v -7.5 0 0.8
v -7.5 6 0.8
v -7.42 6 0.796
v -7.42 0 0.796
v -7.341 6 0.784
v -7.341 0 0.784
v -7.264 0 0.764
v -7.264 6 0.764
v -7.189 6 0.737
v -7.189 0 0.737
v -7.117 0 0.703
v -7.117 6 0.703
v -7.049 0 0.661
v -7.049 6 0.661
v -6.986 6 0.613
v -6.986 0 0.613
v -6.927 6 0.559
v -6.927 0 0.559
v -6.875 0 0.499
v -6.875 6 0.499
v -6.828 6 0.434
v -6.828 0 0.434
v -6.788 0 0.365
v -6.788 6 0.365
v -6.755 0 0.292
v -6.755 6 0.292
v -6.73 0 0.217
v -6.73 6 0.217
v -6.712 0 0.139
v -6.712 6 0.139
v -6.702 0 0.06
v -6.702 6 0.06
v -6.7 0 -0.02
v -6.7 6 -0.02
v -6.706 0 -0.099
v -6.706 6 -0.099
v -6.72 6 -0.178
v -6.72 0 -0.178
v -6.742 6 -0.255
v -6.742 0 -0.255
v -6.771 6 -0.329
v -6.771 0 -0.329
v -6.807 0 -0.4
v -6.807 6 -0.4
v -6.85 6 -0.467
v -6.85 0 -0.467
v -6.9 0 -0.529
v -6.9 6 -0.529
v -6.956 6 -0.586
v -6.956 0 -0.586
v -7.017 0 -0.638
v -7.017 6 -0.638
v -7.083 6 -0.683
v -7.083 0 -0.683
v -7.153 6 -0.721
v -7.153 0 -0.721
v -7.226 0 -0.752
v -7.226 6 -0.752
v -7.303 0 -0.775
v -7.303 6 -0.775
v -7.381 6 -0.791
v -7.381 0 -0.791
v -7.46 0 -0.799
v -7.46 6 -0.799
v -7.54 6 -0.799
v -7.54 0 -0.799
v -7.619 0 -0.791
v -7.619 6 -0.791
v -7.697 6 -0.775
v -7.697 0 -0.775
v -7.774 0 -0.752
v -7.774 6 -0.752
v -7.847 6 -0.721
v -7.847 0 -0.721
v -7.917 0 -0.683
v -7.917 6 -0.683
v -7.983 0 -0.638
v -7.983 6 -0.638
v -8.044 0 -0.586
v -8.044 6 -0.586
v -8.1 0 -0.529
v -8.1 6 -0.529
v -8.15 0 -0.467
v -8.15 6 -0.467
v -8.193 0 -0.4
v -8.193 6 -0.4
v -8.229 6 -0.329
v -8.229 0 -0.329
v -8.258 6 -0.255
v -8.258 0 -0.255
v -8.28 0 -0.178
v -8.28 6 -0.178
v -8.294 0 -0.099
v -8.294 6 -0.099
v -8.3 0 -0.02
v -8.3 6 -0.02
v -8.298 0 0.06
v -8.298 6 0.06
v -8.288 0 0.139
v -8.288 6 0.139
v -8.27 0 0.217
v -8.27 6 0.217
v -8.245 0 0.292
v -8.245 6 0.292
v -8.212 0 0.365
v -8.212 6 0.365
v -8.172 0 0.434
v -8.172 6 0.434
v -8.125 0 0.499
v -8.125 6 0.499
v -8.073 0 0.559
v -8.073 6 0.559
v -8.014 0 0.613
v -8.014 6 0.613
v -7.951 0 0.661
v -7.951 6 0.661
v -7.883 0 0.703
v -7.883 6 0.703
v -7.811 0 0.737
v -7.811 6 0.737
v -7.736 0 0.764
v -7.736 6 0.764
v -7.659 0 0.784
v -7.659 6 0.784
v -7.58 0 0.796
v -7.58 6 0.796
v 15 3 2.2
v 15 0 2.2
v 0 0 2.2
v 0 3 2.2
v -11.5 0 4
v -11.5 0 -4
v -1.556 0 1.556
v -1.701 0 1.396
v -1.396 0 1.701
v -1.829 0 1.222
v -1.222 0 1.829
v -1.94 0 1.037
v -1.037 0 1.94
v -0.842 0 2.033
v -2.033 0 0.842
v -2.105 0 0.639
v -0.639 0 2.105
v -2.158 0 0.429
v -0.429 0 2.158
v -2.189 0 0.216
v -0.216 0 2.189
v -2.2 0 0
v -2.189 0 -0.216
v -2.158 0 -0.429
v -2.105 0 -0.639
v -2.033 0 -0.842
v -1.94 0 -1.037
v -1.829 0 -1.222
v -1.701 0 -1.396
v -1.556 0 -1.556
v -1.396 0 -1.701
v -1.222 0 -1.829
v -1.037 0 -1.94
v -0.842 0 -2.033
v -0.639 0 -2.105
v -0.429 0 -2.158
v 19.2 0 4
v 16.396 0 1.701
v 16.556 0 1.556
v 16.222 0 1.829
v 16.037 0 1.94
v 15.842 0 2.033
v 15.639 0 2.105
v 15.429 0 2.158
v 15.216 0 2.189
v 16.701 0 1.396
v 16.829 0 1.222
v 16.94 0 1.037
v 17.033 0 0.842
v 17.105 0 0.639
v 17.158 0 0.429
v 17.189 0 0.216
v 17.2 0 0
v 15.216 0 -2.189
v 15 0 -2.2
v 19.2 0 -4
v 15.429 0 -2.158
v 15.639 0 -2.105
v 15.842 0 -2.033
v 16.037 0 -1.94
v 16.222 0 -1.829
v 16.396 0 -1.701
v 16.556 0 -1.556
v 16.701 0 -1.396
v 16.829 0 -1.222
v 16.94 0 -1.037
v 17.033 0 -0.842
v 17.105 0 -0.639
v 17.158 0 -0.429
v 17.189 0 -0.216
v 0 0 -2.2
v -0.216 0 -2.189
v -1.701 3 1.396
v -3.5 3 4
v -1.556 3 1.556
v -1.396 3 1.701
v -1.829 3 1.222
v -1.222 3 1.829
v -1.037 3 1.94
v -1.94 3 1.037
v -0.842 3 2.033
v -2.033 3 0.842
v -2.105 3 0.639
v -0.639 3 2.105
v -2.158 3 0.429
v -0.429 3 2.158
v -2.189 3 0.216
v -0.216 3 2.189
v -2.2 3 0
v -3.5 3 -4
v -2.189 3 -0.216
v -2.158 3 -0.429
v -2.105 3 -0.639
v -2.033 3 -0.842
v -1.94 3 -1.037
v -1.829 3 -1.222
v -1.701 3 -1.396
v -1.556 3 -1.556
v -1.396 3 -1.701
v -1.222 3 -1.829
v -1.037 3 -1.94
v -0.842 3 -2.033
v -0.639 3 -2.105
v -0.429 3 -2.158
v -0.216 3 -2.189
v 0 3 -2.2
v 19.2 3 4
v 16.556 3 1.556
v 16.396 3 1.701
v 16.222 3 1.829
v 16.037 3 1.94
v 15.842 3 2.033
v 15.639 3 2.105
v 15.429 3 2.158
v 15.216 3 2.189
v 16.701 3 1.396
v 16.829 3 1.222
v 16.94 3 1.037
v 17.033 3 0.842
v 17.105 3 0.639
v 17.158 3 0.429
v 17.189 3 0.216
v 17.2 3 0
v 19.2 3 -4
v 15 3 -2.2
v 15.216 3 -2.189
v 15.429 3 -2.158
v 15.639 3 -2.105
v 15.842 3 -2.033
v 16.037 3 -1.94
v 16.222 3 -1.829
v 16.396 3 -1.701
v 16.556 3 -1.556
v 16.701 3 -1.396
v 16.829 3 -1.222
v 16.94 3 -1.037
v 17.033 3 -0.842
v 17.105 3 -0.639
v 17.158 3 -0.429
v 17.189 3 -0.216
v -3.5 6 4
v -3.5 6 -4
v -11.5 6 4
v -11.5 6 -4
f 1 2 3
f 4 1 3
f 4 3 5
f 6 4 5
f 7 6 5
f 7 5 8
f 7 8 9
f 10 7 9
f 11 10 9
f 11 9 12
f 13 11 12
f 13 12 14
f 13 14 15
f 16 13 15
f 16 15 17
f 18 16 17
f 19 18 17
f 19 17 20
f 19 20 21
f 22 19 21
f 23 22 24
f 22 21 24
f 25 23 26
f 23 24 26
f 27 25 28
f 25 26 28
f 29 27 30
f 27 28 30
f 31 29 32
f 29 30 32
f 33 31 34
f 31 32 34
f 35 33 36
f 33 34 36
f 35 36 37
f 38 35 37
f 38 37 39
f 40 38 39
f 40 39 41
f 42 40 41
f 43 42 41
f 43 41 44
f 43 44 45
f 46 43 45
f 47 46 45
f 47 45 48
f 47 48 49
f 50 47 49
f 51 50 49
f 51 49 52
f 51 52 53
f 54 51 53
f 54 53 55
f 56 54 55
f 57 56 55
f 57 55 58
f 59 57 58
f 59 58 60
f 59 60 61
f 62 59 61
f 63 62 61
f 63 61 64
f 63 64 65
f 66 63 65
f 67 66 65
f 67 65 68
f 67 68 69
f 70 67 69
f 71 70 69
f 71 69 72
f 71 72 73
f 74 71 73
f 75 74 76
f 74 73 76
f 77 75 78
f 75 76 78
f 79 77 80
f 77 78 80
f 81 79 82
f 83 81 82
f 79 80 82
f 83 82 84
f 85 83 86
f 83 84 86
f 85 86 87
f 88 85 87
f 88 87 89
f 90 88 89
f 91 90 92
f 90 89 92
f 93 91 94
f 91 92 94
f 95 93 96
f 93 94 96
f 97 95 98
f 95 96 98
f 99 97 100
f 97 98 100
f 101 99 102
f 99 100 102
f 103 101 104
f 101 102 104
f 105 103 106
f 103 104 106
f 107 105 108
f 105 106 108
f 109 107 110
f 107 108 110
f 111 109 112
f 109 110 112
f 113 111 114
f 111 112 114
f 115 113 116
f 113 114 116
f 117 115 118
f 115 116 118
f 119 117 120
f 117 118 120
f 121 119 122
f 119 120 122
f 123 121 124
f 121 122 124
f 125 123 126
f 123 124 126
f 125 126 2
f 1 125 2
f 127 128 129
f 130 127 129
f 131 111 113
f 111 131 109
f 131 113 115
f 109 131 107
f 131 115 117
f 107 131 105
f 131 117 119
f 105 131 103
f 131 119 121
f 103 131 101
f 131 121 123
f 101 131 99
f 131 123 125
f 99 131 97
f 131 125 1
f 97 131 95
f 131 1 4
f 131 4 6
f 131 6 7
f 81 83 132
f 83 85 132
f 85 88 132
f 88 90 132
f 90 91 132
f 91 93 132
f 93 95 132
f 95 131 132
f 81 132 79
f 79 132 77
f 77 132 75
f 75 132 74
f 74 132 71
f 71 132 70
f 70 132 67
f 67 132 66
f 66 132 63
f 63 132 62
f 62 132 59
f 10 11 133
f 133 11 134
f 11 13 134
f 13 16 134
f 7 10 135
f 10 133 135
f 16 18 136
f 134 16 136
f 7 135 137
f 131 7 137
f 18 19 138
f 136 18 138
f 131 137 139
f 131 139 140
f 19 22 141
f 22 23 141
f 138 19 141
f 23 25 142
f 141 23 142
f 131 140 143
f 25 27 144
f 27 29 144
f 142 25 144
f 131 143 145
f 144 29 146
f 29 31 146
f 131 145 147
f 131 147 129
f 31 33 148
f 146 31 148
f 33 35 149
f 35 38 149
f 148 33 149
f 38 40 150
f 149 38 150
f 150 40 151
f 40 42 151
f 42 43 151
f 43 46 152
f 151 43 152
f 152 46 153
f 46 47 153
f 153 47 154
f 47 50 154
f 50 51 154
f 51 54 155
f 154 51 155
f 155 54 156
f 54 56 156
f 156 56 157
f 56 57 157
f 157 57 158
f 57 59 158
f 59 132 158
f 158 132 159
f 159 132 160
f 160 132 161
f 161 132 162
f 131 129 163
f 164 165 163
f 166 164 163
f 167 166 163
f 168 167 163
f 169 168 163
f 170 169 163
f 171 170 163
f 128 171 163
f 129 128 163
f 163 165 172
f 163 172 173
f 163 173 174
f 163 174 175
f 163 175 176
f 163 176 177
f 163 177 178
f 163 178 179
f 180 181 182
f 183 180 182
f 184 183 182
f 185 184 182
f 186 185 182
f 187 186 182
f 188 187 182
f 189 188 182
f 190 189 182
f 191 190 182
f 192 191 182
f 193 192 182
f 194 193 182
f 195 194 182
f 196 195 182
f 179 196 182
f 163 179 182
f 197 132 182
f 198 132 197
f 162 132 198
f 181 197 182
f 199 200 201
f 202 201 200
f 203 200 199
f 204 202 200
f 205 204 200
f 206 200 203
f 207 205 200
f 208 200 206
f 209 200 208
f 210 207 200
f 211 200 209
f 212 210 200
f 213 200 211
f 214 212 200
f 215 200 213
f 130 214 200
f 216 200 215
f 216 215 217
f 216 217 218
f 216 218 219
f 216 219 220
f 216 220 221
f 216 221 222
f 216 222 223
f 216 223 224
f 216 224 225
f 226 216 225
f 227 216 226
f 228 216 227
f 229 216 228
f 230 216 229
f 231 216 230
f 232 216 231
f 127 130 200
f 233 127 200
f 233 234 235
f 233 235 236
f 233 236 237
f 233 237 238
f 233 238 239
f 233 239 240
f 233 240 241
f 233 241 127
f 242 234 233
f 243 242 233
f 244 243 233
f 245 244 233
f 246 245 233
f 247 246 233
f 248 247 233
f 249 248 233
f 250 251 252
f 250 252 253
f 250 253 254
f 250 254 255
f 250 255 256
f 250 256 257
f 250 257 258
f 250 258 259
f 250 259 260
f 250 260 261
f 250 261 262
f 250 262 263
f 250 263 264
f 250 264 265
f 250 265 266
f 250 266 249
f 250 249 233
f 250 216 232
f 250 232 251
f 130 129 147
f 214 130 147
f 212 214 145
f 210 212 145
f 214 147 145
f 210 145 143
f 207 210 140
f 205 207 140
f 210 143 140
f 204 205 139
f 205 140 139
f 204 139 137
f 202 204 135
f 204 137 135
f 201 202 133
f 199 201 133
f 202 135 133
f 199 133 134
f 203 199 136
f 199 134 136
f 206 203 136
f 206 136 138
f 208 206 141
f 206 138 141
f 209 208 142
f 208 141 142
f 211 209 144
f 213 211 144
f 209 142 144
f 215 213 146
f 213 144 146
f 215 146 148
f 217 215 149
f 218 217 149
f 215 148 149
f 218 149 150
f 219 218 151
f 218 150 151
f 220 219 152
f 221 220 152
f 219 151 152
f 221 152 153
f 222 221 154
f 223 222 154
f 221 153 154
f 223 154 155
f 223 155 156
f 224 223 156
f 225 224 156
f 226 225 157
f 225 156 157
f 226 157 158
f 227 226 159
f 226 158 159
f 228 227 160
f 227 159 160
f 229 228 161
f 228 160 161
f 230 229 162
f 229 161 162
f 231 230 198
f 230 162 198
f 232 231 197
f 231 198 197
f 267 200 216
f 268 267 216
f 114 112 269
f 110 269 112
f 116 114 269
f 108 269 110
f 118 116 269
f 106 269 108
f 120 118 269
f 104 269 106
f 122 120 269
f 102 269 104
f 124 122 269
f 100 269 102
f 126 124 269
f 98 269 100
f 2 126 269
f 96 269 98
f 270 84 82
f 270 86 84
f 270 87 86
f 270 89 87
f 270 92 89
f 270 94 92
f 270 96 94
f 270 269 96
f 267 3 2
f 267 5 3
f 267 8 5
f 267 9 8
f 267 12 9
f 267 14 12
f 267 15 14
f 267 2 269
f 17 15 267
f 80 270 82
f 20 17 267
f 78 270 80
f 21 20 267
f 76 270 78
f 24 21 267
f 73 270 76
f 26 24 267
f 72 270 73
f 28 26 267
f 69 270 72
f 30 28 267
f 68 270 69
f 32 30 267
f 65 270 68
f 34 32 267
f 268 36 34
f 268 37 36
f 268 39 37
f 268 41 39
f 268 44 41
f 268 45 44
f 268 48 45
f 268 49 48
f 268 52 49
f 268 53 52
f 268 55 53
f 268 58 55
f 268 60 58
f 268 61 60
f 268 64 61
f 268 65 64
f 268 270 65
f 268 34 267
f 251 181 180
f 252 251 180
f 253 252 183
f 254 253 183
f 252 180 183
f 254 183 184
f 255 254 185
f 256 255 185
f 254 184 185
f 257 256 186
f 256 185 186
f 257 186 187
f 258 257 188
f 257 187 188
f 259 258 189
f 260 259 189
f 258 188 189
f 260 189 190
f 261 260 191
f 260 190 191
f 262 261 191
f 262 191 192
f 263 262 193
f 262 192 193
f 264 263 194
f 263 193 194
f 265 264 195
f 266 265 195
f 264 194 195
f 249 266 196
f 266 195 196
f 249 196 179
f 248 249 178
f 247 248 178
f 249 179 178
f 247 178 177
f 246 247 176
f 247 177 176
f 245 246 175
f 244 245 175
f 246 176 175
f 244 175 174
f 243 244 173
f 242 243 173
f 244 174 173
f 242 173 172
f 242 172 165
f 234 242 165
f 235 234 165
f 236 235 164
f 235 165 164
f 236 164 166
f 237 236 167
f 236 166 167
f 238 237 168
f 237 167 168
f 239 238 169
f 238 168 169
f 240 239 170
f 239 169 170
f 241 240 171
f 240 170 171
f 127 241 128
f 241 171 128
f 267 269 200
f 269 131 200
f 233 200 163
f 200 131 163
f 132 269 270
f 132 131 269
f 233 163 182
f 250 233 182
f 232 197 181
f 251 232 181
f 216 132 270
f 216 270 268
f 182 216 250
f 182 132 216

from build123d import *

# Parameters (mm, degrees)
SKETCH1_W           = 30.7
SKETCH1_H           = 8
BOSS_EXTRUDE1_DEPTH = 3
SKETCH2_W           = 8
SKETCH2_H           = 8
BOSS_EXTRUDE2_DEPTH = 3
CUT_EXTRUDE1_REACH  = 22.51
SKETCH3_R           = 0.8


with BuildPart() as part:
    # Sketch1 → Boss-Extrude1 (new body)
    with BuildSketch(Plane(origin=(0, 0, 0), x_dir=(1, 0, 0), z_dir=(0, 1, 0))):
        with Locations((3.85, 0)):
            Rectangle(SKETCH1_W, SKETCH1_H)
        with BuildLine():
            Line((0, 2.2), (15, 2.2))
            ThreePointArc((15, 2.2), (17.2, 0), (15, -2.2))
            Line((15, -2.2), (0, -2.2))
            ThreePointArc((0, -2.2), (-2.2, 0), (0, 2.2))
        make_face(mode=Mode.SUBTRACT)
    extrude(amount=BOSS_EXTRUDE1_DEPTH)

    # Sketch2 → Boss-Extrude2 (add)
    with BuildSketch(Plane(origin=(0, 3, 0), x_dir=(1, 0, 0), z_dir=(0, 1, 0))):
        with Locations((-7.5, 0)):
            Rectangle(SKETCH2_W, SKETCH2_H)
    extrude(amount=BOSS_EXTRUDE2_DEPTH)

    # Sketch3 → Cut-Extrude1 (cut, up to next)
    with BuildSketch(Plane(origin=(0, 6, 0), x_dir=(1, 0, 0), z_dir=(0, 1, 0)), mode=Mode.PRIVATE) as cut_extrude1_sk1:
        with Locations(Location((-7.5, 0, 0), (0, 0, 270))):
            Circle(SKETCH3_R)
    cut_extrude1_tool1 = extrude(cut_extrude1_sk1.sketch, amount=-CUT_EXTRUDE1_REACH, mode=Mode.PRIVATE) & part.part
    add(cut_extrude1_tool1.solids().sort_by_distance((-7.5, 6, 0))[0], mode=Mode.SUBTRACT)


solid = part.part
